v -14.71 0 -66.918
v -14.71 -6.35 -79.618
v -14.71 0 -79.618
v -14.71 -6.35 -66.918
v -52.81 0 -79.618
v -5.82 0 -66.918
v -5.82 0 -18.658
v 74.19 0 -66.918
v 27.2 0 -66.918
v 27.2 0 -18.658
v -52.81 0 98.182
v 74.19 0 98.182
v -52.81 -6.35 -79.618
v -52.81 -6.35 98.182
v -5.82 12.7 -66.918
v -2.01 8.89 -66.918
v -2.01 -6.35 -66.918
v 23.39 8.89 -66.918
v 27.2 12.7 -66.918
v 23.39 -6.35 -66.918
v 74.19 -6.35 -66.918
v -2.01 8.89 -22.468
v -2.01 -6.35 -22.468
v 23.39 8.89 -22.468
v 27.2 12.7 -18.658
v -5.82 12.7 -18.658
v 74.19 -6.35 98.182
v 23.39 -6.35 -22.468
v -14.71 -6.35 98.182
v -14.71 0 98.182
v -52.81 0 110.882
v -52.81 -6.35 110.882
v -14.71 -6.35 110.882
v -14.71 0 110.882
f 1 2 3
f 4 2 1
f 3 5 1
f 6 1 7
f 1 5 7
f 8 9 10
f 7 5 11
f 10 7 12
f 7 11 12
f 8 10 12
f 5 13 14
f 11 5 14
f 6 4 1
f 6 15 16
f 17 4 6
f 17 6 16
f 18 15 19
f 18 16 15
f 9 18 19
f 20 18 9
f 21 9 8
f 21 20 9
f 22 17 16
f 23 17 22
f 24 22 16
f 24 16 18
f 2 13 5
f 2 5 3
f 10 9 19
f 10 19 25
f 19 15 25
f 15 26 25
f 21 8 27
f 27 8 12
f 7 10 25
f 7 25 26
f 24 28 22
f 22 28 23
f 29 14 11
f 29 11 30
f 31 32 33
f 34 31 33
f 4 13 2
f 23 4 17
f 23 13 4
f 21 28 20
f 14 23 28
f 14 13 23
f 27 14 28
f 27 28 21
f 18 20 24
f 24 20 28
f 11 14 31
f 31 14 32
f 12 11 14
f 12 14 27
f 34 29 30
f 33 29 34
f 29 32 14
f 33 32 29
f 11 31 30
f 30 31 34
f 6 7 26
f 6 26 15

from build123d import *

# Parameters (mm, degrees)
F0_W      = 127
F0_H      = 165.1
F1_DEPTH  = 6.35
F2_W      = 12.7
F2_H      = 44.45
F3_DEPTH  = 25.4
F4_DEPTH  = 19.05
F5_W      = 25.4
F5_H      = 3.81
F6_DEPTH  = 44.45
F7_W      = 38.1
F7_H      = 12.7
F8_DEPTH  = 6.35
F9_W      = 38.1
F9_H      = 8.89
F10_DEPTH = 2.54
F11_W     = 38.1
F11_H     = 12.7
F12_DEPTH = 6.35


# Not quite as in the source:
# - a length typed as a fraction of an inch, garbled in the dataset ("3 / 203.2 mm" for 3/8 in), is restored


with BuildPart() as f1:
    # F0 (on Front) → F1 (new body)
    with BuildSketch(Plane.XZ):
        with Locations((10.689943251, 15.6320472565)):
            Rectangle(F0_W, F0_H)
    extrude(amount=F1_DEPTH)

    # F2 (on face) → F3 (cut)
    with BuildSketch(Plane.XZ.offset(6.35)):
        with Locations((4.339943251, -44.6929527435)):
            Rectangle(F2_W, F2_H)
        with Locations((17.039943251, -44.6929527435)):
            Rectangle(F2_W, F2_H)
    extrude(amount=-F3_DEPTH, mode=Mode.SUBTRACT)

    # F2 (on face) → F4 (join)
    with BuildSketch(Plane.XZ.offset(6.35)):
        Polygon((10.689943251, -22.4679527435), (10.689943251, -18.6579527435), (-5.820056749, -18.6579527435), (-5.820056749, -66.9179527435), (-2.010056749, -66.9179527435), (-2.010056749, -22.4679527435), align=None)
        Polygon((27.199943251, -18.6579527435), (10.689943251, -18.6579527435), (10.689943251, -22.4679527435), (23.389943251, -22.4679527435), (23.389943251, -66.9179527435), (27.199943251, -66.9179527435), align=None)
    extrude(amount=-F4_DEPTH)

    # F5 (on face) → F6 (join)
    with BuildSketch(Plane(origin=(0, 0, -22.4679527435), x_dir=(1, 0, 0), z_dir=(0, 0, -1))):
        with Locations((10.689943251, -10.795)):
            Rectangle(F5_W, F5_H)
    extrude(amount=F6_DEPTH)

    # F11 (on face) → F12 (join)
    with BuildSketch(Plane.XZ.offset(6.35)):
        with Locations((-33.760056749, -73.2679527435)):
            Rectangle(F11_W, F11_H)
    extrude(amount=-F12_DEPTH)


with BuildPart() as f8:
    # F7 (on face) → F8 (new body)
    with BuildSketch(Plane.XZ.offset(6.35)):
        with Locations((-33.760056749, 104.5320472565)):
            Rectangle(F7_W, F7_H)
    extrude(amount=-F8_DEPTH)


with BuildPart() as f10:
    # F9 (on face) → F10 (new body)
    with BuildSketch(Plane.XZ.offset(6.35)):
        with Locations((-33.760056749, 110.6541514468)):
            Rectangle(F9_W, F9_H)
    extrude(amount=F10_DEPTH)


solid = Compound([f1.part, f8.part])
